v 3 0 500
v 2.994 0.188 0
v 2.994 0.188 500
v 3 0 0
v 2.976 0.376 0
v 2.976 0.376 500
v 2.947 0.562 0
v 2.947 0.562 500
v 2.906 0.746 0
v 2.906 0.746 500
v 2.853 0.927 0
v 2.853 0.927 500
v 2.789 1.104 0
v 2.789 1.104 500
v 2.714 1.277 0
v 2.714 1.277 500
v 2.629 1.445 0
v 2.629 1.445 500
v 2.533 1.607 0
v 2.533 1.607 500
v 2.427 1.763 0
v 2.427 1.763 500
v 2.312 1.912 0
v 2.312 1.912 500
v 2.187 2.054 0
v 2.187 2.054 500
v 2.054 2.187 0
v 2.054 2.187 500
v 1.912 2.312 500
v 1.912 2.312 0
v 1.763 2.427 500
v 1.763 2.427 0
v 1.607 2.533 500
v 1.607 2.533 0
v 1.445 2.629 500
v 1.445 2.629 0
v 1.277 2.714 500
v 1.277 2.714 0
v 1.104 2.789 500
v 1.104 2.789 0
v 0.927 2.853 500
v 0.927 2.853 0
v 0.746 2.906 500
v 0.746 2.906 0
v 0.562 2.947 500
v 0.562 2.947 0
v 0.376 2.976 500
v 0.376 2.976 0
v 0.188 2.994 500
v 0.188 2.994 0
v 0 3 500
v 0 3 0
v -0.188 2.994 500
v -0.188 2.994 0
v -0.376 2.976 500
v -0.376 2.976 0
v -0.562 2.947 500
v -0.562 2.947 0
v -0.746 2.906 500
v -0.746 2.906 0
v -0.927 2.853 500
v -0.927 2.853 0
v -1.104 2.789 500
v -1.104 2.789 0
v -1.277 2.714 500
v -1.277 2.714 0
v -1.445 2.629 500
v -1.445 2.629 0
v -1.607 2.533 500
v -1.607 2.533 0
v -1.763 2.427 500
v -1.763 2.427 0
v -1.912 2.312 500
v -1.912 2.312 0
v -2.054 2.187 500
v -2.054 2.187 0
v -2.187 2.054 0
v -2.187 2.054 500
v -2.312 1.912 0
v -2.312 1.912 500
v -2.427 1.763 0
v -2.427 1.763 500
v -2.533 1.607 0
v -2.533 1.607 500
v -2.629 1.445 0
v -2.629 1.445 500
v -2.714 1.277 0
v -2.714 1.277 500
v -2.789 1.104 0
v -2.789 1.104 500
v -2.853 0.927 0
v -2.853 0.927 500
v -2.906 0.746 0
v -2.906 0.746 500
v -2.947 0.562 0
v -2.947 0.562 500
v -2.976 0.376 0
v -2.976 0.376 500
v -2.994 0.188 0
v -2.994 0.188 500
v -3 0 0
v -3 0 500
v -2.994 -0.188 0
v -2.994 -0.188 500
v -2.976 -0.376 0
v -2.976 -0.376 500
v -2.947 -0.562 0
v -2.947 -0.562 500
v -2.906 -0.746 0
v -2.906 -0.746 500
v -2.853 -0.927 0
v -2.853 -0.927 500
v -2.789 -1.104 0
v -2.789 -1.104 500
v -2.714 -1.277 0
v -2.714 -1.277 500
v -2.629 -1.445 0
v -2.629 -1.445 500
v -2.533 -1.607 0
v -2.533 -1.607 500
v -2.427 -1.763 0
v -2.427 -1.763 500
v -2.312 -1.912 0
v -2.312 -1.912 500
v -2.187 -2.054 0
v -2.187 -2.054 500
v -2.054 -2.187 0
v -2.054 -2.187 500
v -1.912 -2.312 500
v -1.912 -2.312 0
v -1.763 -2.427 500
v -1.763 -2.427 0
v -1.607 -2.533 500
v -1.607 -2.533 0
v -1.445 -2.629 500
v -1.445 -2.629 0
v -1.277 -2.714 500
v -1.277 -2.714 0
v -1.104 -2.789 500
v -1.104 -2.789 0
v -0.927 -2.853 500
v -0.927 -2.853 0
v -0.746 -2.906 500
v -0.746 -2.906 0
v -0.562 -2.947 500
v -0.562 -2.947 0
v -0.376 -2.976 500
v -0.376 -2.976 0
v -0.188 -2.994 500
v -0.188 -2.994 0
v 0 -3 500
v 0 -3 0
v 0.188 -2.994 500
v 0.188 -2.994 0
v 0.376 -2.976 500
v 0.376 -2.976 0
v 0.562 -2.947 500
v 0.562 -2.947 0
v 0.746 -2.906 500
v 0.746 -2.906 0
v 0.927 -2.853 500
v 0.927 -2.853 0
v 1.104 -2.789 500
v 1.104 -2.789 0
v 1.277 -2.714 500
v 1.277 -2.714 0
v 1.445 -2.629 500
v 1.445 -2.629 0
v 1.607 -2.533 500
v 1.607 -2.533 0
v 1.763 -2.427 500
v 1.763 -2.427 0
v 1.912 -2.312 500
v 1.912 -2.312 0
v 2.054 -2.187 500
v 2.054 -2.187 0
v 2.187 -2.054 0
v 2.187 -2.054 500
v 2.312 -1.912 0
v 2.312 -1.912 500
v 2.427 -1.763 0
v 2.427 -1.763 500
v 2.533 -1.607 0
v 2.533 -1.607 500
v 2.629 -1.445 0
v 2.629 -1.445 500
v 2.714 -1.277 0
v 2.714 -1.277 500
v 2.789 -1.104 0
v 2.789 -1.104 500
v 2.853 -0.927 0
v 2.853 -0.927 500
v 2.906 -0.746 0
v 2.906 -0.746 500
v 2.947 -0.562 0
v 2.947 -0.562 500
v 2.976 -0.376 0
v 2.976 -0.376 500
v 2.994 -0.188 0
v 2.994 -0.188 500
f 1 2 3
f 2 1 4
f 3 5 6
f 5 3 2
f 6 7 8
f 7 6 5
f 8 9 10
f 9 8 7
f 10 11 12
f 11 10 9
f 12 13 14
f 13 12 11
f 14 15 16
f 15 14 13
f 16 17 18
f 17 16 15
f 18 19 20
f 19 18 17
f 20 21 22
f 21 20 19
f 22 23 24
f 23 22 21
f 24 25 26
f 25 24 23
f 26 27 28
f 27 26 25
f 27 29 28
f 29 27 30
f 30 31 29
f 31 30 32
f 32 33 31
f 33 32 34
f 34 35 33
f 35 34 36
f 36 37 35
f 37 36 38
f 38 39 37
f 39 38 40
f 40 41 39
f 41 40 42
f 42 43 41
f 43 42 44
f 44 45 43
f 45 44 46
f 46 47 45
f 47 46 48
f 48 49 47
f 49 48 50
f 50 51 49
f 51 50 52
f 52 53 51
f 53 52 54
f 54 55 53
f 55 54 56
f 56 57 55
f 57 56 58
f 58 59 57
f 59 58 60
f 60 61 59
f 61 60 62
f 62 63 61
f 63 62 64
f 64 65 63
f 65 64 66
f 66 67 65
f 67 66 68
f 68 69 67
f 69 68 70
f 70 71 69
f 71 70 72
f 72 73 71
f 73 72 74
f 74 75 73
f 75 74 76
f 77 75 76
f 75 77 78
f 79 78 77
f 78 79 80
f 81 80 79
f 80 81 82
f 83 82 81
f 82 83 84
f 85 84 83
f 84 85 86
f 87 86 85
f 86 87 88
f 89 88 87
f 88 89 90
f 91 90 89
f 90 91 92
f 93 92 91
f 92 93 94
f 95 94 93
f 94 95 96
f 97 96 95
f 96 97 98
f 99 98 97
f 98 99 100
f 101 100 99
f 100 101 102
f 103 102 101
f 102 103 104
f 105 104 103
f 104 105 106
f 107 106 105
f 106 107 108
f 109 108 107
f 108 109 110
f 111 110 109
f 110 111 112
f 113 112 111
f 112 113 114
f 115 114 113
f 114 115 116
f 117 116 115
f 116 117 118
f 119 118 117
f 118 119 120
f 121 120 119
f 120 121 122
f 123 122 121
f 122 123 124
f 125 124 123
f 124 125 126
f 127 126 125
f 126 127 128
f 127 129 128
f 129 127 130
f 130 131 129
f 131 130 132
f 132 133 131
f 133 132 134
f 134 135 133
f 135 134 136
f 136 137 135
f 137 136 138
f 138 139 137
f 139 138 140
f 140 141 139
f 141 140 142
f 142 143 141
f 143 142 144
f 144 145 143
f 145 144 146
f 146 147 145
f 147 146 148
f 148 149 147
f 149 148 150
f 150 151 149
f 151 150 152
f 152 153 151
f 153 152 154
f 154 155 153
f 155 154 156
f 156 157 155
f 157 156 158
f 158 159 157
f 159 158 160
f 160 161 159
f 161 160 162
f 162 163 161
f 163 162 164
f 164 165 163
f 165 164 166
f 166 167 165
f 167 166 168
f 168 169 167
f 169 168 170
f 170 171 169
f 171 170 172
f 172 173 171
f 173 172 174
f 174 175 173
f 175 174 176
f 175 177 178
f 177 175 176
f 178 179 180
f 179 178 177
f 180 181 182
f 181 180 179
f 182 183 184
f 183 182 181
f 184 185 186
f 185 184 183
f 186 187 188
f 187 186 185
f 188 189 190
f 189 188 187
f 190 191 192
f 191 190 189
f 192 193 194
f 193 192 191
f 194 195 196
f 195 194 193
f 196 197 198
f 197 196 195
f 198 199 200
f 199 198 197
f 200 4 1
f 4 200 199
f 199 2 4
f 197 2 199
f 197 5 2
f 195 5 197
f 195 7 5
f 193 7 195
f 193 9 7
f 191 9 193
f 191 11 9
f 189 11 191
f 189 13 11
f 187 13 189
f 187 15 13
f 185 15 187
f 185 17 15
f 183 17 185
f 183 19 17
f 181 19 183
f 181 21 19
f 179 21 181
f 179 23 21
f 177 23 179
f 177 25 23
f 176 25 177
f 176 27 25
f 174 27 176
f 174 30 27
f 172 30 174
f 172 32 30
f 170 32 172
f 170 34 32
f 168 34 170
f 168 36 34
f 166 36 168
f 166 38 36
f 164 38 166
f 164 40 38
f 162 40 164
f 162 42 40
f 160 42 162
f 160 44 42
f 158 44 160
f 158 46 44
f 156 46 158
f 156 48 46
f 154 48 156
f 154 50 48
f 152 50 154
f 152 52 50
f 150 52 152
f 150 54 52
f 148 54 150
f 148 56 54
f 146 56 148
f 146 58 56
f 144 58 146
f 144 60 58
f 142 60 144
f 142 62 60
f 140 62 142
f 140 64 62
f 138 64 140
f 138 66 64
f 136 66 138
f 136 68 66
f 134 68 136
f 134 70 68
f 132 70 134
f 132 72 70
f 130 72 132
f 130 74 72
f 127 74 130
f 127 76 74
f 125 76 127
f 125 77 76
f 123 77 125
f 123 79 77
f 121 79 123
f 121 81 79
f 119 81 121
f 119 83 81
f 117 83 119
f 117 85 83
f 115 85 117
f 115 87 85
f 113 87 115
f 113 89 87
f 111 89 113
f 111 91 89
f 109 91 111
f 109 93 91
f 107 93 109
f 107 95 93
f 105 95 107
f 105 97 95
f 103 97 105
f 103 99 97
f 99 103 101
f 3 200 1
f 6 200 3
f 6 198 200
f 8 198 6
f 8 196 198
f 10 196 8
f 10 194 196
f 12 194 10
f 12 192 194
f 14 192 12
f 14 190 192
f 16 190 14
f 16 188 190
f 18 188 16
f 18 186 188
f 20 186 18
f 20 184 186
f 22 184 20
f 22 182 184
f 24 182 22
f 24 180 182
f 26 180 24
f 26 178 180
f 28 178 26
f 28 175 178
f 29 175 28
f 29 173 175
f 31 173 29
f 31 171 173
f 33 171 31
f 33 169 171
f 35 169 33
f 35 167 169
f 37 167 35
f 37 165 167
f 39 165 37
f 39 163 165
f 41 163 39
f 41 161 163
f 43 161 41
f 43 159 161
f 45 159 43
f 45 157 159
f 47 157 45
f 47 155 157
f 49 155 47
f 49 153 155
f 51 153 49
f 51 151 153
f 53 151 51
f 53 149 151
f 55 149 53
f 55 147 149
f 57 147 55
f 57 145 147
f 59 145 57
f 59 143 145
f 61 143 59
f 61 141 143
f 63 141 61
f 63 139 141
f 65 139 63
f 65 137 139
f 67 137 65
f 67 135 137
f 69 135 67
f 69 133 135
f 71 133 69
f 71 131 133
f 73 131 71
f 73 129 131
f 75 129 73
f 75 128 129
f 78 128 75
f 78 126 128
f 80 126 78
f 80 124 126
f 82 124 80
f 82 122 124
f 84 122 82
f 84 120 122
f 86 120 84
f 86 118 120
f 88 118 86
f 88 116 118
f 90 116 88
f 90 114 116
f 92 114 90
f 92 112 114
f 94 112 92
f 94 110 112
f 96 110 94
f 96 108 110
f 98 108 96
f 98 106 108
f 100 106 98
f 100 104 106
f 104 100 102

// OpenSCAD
// Parámetros de la varilla
varilla_largo = 500;        // Largo de la varilla
varilla_diametro = 6;       // Diámetro de la varilla

// Cuerpo de la varilla
translate([0, 0, 0])
    cylinder(h = varilla_largo, d = varilla_diametro, $fn = 100);
